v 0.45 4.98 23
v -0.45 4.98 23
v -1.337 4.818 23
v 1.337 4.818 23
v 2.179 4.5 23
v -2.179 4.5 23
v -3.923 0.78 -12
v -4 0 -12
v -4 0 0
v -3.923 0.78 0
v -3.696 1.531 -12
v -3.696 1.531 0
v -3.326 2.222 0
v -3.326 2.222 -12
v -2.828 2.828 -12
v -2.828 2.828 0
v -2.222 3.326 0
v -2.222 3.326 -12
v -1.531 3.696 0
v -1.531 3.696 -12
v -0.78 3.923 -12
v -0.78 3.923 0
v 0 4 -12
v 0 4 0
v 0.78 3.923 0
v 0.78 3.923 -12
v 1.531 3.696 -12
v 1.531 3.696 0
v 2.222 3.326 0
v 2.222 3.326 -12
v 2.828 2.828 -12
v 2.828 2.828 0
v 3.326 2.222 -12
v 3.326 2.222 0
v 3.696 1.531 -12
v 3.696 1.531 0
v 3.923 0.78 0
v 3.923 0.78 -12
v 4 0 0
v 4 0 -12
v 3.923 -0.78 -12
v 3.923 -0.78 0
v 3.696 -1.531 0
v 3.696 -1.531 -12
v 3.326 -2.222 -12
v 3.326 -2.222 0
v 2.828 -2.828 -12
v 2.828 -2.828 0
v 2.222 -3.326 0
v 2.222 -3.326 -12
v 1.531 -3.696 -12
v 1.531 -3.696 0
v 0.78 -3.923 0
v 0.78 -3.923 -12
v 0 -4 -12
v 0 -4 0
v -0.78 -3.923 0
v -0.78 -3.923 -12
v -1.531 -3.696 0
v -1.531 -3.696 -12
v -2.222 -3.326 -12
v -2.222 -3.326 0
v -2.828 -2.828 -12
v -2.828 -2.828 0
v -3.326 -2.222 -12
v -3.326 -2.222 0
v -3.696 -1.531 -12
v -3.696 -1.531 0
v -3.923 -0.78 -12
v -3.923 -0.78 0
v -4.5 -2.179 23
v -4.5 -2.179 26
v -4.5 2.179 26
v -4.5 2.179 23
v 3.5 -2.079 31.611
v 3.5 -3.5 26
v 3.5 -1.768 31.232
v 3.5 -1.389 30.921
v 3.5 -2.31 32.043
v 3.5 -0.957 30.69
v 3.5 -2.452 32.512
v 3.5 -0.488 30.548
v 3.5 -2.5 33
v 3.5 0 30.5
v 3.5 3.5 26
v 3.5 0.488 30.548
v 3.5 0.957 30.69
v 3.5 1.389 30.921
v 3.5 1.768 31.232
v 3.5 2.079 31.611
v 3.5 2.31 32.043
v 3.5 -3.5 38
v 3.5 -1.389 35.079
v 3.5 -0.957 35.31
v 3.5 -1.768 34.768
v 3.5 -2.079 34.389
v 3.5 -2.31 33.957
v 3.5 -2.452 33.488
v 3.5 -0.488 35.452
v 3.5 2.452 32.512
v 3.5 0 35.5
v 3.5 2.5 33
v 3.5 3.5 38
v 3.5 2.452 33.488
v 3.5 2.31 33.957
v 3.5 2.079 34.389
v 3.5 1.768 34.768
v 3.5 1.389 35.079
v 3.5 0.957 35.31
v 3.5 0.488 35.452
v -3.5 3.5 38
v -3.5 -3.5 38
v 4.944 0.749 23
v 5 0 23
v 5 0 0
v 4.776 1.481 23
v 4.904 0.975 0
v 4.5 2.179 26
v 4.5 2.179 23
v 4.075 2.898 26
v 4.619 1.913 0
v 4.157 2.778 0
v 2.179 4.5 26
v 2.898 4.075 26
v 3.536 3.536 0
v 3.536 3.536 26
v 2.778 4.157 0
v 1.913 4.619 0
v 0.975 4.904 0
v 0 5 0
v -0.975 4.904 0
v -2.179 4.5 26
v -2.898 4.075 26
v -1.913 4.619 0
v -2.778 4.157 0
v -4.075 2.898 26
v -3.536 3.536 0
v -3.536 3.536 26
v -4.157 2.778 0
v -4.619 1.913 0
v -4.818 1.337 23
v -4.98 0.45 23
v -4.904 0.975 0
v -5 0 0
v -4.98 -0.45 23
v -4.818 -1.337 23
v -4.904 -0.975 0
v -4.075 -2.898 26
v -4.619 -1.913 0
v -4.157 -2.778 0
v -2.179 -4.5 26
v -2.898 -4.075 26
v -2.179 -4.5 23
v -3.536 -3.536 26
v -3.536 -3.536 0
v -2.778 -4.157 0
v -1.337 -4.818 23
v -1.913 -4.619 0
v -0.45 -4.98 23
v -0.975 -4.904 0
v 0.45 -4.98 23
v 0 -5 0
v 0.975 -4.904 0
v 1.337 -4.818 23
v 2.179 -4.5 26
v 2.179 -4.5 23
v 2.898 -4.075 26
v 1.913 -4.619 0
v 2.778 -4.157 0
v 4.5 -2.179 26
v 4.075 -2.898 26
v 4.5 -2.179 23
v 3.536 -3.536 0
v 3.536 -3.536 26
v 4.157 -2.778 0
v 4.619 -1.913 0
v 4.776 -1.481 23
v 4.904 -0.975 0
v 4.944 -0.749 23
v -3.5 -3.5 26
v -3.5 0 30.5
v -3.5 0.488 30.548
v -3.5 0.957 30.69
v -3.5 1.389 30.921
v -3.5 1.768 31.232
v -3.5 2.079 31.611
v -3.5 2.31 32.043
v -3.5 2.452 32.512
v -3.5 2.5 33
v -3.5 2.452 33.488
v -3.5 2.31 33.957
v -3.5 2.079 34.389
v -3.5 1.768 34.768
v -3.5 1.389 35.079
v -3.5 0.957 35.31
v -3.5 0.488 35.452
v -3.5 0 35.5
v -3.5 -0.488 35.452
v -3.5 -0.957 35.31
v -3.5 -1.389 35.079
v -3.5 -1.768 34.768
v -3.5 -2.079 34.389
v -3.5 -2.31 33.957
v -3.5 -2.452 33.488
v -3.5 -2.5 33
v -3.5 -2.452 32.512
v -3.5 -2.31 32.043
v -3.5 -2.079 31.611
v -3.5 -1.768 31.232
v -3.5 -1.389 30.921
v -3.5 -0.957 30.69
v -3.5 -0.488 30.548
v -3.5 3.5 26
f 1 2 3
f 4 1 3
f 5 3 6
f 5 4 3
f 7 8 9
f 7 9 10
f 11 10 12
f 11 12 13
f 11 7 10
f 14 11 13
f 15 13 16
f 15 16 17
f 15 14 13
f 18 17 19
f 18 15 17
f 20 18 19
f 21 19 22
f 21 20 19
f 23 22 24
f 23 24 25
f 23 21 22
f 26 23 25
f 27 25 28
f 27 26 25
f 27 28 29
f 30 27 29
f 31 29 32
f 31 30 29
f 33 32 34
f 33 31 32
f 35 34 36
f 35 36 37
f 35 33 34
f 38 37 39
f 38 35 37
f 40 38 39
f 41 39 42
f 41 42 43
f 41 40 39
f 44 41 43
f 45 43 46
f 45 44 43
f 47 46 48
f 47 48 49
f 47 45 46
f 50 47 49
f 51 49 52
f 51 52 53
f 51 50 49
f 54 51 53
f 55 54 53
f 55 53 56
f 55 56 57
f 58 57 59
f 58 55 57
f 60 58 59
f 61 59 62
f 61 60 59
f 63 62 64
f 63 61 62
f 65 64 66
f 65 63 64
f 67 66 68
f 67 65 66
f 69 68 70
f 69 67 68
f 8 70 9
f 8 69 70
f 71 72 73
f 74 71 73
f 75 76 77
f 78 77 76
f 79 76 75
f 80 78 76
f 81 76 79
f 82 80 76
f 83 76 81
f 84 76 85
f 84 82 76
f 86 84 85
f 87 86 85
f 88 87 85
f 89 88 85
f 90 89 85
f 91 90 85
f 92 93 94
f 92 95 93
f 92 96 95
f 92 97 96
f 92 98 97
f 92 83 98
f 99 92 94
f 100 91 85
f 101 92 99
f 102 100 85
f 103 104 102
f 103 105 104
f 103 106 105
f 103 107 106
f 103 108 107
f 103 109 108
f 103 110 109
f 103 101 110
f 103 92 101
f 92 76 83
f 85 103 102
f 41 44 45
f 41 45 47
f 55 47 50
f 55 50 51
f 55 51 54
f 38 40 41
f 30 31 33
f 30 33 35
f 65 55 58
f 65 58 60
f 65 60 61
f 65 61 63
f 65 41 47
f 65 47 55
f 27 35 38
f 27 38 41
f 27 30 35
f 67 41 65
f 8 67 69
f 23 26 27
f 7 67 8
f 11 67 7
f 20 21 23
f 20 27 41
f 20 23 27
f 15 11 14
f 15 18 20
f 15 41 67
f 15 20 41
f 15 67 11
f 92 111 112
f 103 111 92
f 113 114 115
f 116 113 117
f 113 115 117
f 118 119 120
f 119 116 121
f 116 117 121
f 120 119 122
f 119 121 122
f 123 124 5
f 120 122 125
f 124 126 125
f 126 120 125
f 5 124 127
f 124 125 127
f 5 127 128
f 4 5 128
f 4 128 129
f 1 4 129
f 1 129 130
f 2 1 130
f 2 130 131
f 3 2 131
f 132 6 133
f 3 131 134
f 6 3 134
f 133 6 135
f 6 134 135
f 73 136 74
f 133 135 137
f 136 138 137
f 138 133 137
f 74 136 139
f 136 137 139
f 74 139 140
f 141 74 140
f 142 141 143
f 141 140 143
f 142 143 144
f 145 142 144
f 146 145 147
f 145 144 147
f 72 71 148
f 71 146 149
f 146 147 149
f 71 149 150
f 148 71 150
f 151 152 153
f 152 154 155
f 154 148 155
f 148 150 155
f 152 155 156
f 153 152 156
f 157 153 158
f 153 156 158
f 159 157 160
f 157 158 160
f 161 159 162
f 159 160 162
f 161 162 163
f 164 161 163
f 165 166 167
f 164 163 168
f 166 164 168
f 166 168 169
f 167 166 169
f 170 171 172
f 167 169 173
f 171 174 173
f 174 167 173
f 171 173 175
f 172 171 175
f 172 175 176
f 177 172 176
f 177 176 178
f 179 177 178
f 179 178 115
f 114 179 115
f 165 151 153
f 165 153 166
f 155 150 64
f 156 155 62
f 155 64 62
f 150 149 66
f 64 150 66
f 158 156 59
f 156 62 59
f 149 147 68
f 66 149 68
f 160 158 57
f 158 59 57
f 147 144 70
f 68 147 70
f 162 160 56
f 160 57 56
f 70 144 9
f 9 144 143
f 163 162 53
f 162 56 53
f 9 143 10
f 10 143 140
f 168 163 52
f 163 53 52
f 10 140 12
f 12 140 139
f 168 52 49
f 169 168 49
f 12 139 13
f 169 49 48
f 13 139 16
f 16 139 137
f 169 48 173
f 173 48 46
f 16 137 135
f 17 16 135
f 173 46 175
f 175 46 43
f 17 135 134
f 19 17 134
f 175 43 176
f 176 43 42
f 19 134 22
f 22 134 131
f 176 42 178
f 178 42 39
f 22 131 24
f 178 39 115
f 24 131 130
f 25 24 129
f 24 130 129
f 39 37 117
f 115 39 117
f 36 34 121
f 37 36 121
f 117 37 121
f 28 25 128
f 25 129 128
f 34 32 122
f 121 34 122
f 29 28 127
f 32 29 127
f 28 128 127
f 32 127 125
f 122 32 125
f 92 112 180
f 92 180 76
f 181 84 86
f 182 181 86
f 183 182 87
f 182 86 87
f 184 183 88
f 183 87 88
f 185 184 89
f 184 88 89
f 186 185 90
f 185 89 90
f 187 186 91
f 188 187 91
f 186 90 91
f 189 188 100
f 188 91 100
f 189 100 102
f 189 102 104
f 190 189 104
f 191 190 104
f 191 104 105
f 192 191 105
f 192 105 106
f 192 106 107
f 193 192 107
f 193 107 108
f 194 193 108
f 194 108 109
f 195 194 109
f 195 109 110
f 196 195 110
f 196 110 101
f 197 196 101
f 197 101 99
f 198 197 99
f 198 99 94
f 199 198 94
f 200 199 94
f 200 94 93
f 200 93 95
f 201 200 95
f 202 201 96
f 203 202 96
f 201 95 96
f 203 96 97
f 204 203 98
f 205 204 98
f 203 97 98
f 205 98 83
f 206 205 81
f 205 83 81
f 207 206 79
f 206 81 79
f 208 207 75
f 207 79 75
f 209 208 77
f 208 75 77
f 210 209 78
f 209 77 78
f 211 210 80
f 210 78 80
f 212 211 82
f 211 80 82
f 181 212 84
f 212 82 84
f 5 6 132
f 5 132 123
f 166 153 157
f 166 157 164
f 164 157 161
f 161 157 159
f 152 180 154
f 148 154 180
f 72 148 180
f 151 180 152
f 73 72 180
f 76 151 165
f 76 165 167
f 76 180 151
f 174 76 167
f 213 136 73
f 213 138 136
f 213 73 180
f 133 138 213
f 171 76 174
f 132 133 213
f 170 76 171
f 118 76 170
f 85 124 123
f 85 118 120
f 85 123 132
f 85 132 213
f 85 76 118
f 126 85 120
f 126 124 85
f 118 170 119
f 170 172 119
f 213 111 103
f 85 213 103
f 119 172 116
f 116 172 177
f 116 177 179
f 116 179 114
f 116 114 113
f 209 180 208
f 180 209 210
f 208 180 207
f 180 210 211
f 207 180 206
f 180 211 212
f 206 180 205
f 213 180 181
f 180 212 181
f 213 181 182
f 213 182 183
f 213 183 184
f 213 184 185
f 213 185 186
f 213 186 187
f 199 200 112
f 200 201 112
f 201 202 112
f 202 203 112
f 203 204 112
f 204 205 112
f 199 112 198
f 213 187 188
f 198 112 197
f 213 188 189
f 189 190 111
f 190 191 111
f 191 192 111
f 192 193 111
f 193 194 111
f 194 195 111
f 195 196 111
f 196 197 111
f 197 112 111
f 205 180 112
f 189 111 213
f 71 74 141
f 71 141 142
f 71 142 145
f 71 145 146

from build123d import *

# Parameters (mm, degrees)
ESQUISSE1_R             = 5
BOSS_EXTRU_2_DEPTH      = 70
ESQUISSE2_R             = 3.5
BOSS_EXTRU_3_DEPTH      = 12
ESQUISSE4_R             = 15
BOSS_EXTRU_5_DEPTH      = 5
ESQUISSE5_R             = 3.5
BOSS_EXTRU_6_DEPTH      = 12
ENL_V_MAT_EXTRU_1_DEPTH = 12
ESQUISSE7_R             = 15
ENL_V_MAT_EXTRU_2_DEPTH = 47
ESQUISSE8_W             = 9
ESQUISSE8_H             = 9
BOSS_EXTRU_7_DEPTH      = 5
ESQUISSE9_W             = 10
ESQUISSE9_H             = 10
ESQUISSE9_W_2           = 9
ESQUISSE9_H_2           = 9
ENL_V_MAT_EXTRU_3_DEPTH = 12
ESQUISSE10_W            = 9
ESQUISSE10_H            = 9
BOSS_EXTRU_8_DEPTH      = 7
ESQUISSE11_W            = 9
ESQUISSE11_H            = 9
ENL_V_MAT_EXTRU_4_DEPTH = 4
ESQUISSE13_W            = 9
ESQUISSE13_H            = 9
BOSS_EXTRU_9_DEPTH      = 12
ESQUISSE14_W            = 9
ESQUISSE14_H            = 9
ESQUISSE14_W_2          = 7
ESQUISSE14_H_2          = 7
ENL_V_MAT_EXTRU_5_DEPTH = 12
ESQUISSE15_R            = 2.5
ENL_V_MAT_EXTRU_6_DEPTH = 12
ESQUISSE16_R            = 4
BOSS_EXTRU_10_DEPTH     = 12


with BuildPart() as part:
    # Esquisse1 → Boss.-Extru.2 (new body)
    with BuildSketch(Plane.XY):
        Circle(ESQUISSE1_R)
    extrude(amount=BOSS_EXTRU_2_DEPTH)

    # Esquisse2 → Boss.-Extru.3 (add)
    with BuildSketch(Plane(origin=(0, 0, 0), x_dir=(-1, 0, 0), z_dir=(0, 0, -1))):
        Circle(ESQUISSE2_R)
    extrude(amount=BOSS_EXTRU_3_DEPTH)

    # Esquisse4 → Boss.-Extru.5 (add)
    with BuildSketch(Plane.XY.offset(70)):
        Circle(ESQUISSE4_R)
    extrude(amount=-BOSS_EXTRU_5_DEPTH)

    # Esquisse5 → Boss.-Extru.6 (add)
    with BuildSketch(Plane.XY.offset(70)):
        Circle(ESQUISSE5_R)
    extrude(amount=BOSS_EXTRU_6_DEPTH)

    # Esquisse6 → Enlèv. mat.-Extru.1 (cut)
    with BuildSketch(Plane.XY.offset(70)):
        with BuildLine():
            Line((-6.262893089, 8.172072336), (-7.499435292, 12.990707074))
            ThreePointArc((-7.499435292, 12.990707074), (-9.123657799, 11.90625333), (-10.593218546, 10.619968024))
            Line((-10.593218546, 10.619968024), (-6.262893089, 8.172072336))
        make_face()
        with BuildLine():
            Line((-8.152402023, 6.270263162), (-10.606442664, 10.606760769))
            ThreePointArc((-10.606442664, 10.606760769), (-11.894621233, 9.138817524), (-12.981158937, 7.515950549))
            Line((-12.981158937, 7.515950549), (-8.152402023, 6.270263162))
        make_face()
        with BuildLine():
            Line((-9.499942261, 3.951679007), (-12.981158937, 7.515950549))
            ThreePointArc((-12.981158937, 7.515950549), (-13.849269023, 5.761748652), (-14.481582106, 3.909447494))
            Line((-14.481582106, 3.909447494), (-9.499942261, 3.951679007))
        make_face()
        with BuildLine():
            Line((-10.188028074, 1.356459322), (-14.486441985, 3.891400598))
            ThreePointArc((-14.486441985, 3.891400598), (-14.869805294, 1.972027008), (-14.999987869, 0.0190767))
            Line((-14.999987869, 0.0190767), (-10.188028074, 1.356459322))
        make_face()
        with BuildLine():
            ThreePointArc((-14.999987869, -0.0190767), (-14.869805294, -1.972027008), (-14.486441985, -3.891400598))
            Line((-14.486441985, -3.891400598), (-10.188028074, -1.356459322))
            Line((-10.188028074, -1.356459322), (-14.999987869, -0.0190767))
        make_face()
        with BuildLine():
            Line((-9.499942261, -3.951679007), (-14.481582106, -3.909447494))
            ThreePointArc((-14.481582106, -3.909447494), (-13.849269023, -5.761748652), (-12.981158937, -7.515950549))
            Line((-12.981158937, -7.515950549), (-9.499942261, -3.951679007))
        make_face()
        with BuildLine():
            Line((-8.152402023, -6.270263162), (-12.981158937, -7.515950549))
            ThreePointArc((-12.981158937, -7.515950549), (-11.894621233, -9.138817524), (-10.606442664, -10.606760769))
            Line((-10.606442664, -10.606760769), (-8.152402023, -6.270263162))
        make_face()
        with BuildLine():
            Line((-6.262893089, -8.172072336), (-10.593218546, -10.619968024))
            ThreePointArc((-10.593218546, -10.619968024), (-9.123657799, -11.90625333), (-7.499435292, -12.990707074))
            Line((-7.499435292, -12.990707074), (-6.262893089, -8.172072336))
        make_face()
        with BuildLine():
            Line((-3.939593974, -9.504960245), (-7.499435292, -12.990707074))
            ThreePointArc((-7.499435292, -12.990707074), (-5.744130769, -13.8565855), (-3.891026946, -14.486542352))
            Line((-3.891026946, -14.486542352), (-3.939593974, -9.504960245))
        make_face()
        with BuildLine():
            Line((-1.343501295, -10.189744953), (-3.872973884, -14.491379275))
            ThreePointArc((-3.872973884, -14.491379275), (-1.953114292, -14.872301253), (0, -15))
            Line((0, -15), (-1.343501295, -10.189744953))
        make_face()
        with BuildLine():
            ThreePointArc((0, -15), (1.953114292, -14.872301253), (3.872973884, -14.491379275))
            Line((3.872973884, -14.491379275), (1.343501295, -10.189744953))
            Line((1.343501295, -10.189744953), (0, -15))
        make_face()
        with BuildLine():
            ThreePointArc((3.891026946, -14.486542352), (5.744130769, -13.8565855), (7.499435292, -12.990707074))
            Line((7.499435292, -12.990707074), (3.939593974, -9.504960245))
            Line((3.939593974, -9.504960245), (3.891026946, -14.486542352))
        make_face()
        with BuildLine():
            ThreePointArc((7.499435292, -12.990707074), (9.123657799, -11.90625333), (10.593218546, -10.619968024))
            Line((10.593218546, -10.619968024), (6.262893089, -8.172072336))
            Line((6.262893089, -8.172072336), (7.499435292, -12.990707074))
        make_face()
        with BuildLine():
            ThreePointArc((10.606442664, -10.606760769), (11.894621233, -9.138817524), (12.981158937, -7.515950549))
            Line((12.981158937, -7.515950549), (8.152402023, -6.270263162))
            Line((8.152402023, -6.270263162), (10.606442664, -10.606760769))
        make_face()
        with BuildLine():
            ThreePointArc((12.981158937, -7.515950549), (13.849269023, -5.761748652), (14.481582106, -3.909447494))
            Line((14.481582106, -3.909447494), (9.499942261, -3.951679007))
            Line((9.499942261, -3.951679007), (12.981158937, -7.515950549))
        make_face()
        with BuildLine():
            ThreePointArc((15, 0), (14.999996967, 0.009538352), (14.999987869, 0.0190767))
            Line((14.999987869, 0.0190767), (10.159352957, -1.339548494))
            Line((10.159352957, -1.339548494), (14.486441985, -3.891400598))
            ThreePointArc((14.486441985, -3.891400598), (14.87105628, -1.962571047), (15, 0))
        make_face()
        with BuildLine():
            ThreePointArc((14.999987869, 0.0190767), (14.869805294, 1.972027008), (14.486441985, 3.891400598))
            Line((14.486441985, 3.891400598), (10.188028074, 1.356459322))
            Line((10.188028074, 1.356459322), (14.999987869, 0.0190767))
        make_face()
        with BuildLine():
            ThreePointArc((14.481582106, 3.909447494), (13.849269023, 5.761748652), (12.981158937, 7.515950549))
            Line((12.981158937, 7.515950549), (9.499942261, 3.951679007))
            Line((9.499942261, 3.951679007), (14.481582106, 3.909447494))
        make_face()
        with BuildLine():
            ThreePointArc((12.981158937, 7.515950549), (11.894621233, 9.138817524), (10.606442664, 10.606760769))
            Line((10.606442664, 10.606760769), (8.152402023, 6.270263162))
            Line((8.152402023, 6.270263162), (12.981158937, 7.515950549))
        make_face()
        with BuildLine():
            ThreePointArc((10.593218546, 10.619968024), (9.123657799, 11.90625333), (7.499435292, 12.990707074))
            Line((7.499435292, 12.990707074), (6.262893089, 8.172072336))
            Line((6.262893089, 8.172072336), (10.593218546, 10.619968024))
        make_face()
        with BuildLine():
            ThreePointArc((7.499435292, 12.990707074), (5.744130769, 13.8565855), (3.891026946, 14.486542352))
            Line((3.891026946, 14.486542352), (3.939593974, 9.504960245))
            Line((3.939593974, 9.504960245), (7.499435292, 12.990707074))
        make_face()
        with BuildLine():
            ThreePointArc((3.872973884, 14.491379275), (1.953114292, 14.872301253), (0, 15))
            Line((0, 15), (1.343501295, 10.189744953))
            Line((1.343501295, 10.189744953), (3.872973884, 14.491379275))
        make_face()
        with BuildLine():
            Line((-1.343501295, 10.189744953), (0, 15))
            ThreePointArc((0, 15), (-1.953114292, 14.872301253), (-3.872973884, 14.491379275))
            Line((-3.872973884, 14.491379275), (-1.343501295, 10.189744953))
        make_face()
        with BuildLine():
            Line((-3.939593974, 9.504960245), (-3.891026946, 14.486542352))
            ThreePointArc((-3.891026946, 14.486542352), (-5.744130769, 13.8565855), (-7.499435292, 12.990707074))
            Line((-7.499435292, 12.990707074), (-3.939593974, 9.504960245))
        make_face()
    extrude(amount=-ENL_V_MAT_EXTRU_1_DEPTH, mode=Mode.SUBTRACT)

    # Esquisse7 → Enlèv. mat.-Extru.2 (cut)
    with BuildSketch(Plane.XY.offset(82)):
        Circle(ESQUISSE7_R)
    extrude(amount=-ENL_V_MAT_EXTRU_2_DEPTH, mode=Mode.SUBTRACT)

    # Esquisse8 → Boss.-Extru.7 (add)
    with BuildSketch(Plane.XY.offset(35)):
        Rectangle(ESQUISSE8_W, ESQUISSE8_H)
    extrude(amount=-BOSS_EXTRU_7_DEPTH)

    # Esquisse9 → Enlèv. mat.-Extru.3 (cut)
    with BuildSketch(Plane.XY.offset(35)):
        Rectangle(ESQUISSE9_W, ESQUISSE9_H)
        Rectangle(ESQUISSE9_W_2, ESQUISSE9_H_2, mode=Mode.SUBTRACT)
    extrude(amount=-ENL_V_MAT_EXTRU_3_DEPTH, mode=Mode.SUBTRACT)

    # Esquisse10 → Boss.-Extru.8 (add)
    with BuildSketch(Plane.XY.offset(35)):
        Rectangle(ESQUISSE10_W, ESQUISSE10_H)
    extrude(amount=BOSS_EXTRU_8_DEPTH)

    # Esquisse11 → Enlèv. mat.-Extru.4 (cut)
    with BuildSketch(Plane.XY.offset(42)):
        Rectangle(ESQUISSE11_W, ESQUISSE11_H)
    extrude(amount=-ENL_V_MAT_EXTRU_4_DEPTH, mode=Mode.SUBTRACT)

    # Esquisse13 → Boss.-Extru.9 (add)
    with BuildSketch(Plane.XY.offset(38)):
        Rectangle(ESQUISSE13_W, ESQUISSE13_H)
    extrude(amount=-BOSS_EXTRU_9_DEPTH)

    # Esquisse14 → Enlèv. mat.-Extru.5 (cut)
    with BuildSketch(Plane.XY.offset(38)):
        Rectangle(ESQUISSE14_W, ESQUISSE14_H)
        Rectangle(ESQUISSE14_W_2, ESQUISSE14_H_2, mode=Mode.SUBTRACT)
    extrude(amount=-ENL_V_MAT_EXTRU_5_DEPTH, mode=Mode.SUBTRACT)

    # Esquisse15 → Enlèv. mat.-Extru.6 (cut)
    with BuildSketch(Plane(origin=(3.5, 0, 0), x_dir=(0, 0, -1), z_dir=(1, 0, 0))):
        with Locations((-33, 0)):
            Circle(ESQUISSE15_R)
    extrude(amount=-ENL_V_MAT_EXTRU_6_DEPTH, mode=Mode.SUBTRACT)

    # Esquisse16 → Boss.-Extru.10 (add)
    with BuildSketch(Plane(origin=(0, 0, -12), x_dir=(-1, 0, 0), z_dir=(0, 0, -1))):
        Circle(ESQUISSE16_R)
    extrude(amount=-BOSS_EXTRU_10_DEPTH)


solid = part.part
